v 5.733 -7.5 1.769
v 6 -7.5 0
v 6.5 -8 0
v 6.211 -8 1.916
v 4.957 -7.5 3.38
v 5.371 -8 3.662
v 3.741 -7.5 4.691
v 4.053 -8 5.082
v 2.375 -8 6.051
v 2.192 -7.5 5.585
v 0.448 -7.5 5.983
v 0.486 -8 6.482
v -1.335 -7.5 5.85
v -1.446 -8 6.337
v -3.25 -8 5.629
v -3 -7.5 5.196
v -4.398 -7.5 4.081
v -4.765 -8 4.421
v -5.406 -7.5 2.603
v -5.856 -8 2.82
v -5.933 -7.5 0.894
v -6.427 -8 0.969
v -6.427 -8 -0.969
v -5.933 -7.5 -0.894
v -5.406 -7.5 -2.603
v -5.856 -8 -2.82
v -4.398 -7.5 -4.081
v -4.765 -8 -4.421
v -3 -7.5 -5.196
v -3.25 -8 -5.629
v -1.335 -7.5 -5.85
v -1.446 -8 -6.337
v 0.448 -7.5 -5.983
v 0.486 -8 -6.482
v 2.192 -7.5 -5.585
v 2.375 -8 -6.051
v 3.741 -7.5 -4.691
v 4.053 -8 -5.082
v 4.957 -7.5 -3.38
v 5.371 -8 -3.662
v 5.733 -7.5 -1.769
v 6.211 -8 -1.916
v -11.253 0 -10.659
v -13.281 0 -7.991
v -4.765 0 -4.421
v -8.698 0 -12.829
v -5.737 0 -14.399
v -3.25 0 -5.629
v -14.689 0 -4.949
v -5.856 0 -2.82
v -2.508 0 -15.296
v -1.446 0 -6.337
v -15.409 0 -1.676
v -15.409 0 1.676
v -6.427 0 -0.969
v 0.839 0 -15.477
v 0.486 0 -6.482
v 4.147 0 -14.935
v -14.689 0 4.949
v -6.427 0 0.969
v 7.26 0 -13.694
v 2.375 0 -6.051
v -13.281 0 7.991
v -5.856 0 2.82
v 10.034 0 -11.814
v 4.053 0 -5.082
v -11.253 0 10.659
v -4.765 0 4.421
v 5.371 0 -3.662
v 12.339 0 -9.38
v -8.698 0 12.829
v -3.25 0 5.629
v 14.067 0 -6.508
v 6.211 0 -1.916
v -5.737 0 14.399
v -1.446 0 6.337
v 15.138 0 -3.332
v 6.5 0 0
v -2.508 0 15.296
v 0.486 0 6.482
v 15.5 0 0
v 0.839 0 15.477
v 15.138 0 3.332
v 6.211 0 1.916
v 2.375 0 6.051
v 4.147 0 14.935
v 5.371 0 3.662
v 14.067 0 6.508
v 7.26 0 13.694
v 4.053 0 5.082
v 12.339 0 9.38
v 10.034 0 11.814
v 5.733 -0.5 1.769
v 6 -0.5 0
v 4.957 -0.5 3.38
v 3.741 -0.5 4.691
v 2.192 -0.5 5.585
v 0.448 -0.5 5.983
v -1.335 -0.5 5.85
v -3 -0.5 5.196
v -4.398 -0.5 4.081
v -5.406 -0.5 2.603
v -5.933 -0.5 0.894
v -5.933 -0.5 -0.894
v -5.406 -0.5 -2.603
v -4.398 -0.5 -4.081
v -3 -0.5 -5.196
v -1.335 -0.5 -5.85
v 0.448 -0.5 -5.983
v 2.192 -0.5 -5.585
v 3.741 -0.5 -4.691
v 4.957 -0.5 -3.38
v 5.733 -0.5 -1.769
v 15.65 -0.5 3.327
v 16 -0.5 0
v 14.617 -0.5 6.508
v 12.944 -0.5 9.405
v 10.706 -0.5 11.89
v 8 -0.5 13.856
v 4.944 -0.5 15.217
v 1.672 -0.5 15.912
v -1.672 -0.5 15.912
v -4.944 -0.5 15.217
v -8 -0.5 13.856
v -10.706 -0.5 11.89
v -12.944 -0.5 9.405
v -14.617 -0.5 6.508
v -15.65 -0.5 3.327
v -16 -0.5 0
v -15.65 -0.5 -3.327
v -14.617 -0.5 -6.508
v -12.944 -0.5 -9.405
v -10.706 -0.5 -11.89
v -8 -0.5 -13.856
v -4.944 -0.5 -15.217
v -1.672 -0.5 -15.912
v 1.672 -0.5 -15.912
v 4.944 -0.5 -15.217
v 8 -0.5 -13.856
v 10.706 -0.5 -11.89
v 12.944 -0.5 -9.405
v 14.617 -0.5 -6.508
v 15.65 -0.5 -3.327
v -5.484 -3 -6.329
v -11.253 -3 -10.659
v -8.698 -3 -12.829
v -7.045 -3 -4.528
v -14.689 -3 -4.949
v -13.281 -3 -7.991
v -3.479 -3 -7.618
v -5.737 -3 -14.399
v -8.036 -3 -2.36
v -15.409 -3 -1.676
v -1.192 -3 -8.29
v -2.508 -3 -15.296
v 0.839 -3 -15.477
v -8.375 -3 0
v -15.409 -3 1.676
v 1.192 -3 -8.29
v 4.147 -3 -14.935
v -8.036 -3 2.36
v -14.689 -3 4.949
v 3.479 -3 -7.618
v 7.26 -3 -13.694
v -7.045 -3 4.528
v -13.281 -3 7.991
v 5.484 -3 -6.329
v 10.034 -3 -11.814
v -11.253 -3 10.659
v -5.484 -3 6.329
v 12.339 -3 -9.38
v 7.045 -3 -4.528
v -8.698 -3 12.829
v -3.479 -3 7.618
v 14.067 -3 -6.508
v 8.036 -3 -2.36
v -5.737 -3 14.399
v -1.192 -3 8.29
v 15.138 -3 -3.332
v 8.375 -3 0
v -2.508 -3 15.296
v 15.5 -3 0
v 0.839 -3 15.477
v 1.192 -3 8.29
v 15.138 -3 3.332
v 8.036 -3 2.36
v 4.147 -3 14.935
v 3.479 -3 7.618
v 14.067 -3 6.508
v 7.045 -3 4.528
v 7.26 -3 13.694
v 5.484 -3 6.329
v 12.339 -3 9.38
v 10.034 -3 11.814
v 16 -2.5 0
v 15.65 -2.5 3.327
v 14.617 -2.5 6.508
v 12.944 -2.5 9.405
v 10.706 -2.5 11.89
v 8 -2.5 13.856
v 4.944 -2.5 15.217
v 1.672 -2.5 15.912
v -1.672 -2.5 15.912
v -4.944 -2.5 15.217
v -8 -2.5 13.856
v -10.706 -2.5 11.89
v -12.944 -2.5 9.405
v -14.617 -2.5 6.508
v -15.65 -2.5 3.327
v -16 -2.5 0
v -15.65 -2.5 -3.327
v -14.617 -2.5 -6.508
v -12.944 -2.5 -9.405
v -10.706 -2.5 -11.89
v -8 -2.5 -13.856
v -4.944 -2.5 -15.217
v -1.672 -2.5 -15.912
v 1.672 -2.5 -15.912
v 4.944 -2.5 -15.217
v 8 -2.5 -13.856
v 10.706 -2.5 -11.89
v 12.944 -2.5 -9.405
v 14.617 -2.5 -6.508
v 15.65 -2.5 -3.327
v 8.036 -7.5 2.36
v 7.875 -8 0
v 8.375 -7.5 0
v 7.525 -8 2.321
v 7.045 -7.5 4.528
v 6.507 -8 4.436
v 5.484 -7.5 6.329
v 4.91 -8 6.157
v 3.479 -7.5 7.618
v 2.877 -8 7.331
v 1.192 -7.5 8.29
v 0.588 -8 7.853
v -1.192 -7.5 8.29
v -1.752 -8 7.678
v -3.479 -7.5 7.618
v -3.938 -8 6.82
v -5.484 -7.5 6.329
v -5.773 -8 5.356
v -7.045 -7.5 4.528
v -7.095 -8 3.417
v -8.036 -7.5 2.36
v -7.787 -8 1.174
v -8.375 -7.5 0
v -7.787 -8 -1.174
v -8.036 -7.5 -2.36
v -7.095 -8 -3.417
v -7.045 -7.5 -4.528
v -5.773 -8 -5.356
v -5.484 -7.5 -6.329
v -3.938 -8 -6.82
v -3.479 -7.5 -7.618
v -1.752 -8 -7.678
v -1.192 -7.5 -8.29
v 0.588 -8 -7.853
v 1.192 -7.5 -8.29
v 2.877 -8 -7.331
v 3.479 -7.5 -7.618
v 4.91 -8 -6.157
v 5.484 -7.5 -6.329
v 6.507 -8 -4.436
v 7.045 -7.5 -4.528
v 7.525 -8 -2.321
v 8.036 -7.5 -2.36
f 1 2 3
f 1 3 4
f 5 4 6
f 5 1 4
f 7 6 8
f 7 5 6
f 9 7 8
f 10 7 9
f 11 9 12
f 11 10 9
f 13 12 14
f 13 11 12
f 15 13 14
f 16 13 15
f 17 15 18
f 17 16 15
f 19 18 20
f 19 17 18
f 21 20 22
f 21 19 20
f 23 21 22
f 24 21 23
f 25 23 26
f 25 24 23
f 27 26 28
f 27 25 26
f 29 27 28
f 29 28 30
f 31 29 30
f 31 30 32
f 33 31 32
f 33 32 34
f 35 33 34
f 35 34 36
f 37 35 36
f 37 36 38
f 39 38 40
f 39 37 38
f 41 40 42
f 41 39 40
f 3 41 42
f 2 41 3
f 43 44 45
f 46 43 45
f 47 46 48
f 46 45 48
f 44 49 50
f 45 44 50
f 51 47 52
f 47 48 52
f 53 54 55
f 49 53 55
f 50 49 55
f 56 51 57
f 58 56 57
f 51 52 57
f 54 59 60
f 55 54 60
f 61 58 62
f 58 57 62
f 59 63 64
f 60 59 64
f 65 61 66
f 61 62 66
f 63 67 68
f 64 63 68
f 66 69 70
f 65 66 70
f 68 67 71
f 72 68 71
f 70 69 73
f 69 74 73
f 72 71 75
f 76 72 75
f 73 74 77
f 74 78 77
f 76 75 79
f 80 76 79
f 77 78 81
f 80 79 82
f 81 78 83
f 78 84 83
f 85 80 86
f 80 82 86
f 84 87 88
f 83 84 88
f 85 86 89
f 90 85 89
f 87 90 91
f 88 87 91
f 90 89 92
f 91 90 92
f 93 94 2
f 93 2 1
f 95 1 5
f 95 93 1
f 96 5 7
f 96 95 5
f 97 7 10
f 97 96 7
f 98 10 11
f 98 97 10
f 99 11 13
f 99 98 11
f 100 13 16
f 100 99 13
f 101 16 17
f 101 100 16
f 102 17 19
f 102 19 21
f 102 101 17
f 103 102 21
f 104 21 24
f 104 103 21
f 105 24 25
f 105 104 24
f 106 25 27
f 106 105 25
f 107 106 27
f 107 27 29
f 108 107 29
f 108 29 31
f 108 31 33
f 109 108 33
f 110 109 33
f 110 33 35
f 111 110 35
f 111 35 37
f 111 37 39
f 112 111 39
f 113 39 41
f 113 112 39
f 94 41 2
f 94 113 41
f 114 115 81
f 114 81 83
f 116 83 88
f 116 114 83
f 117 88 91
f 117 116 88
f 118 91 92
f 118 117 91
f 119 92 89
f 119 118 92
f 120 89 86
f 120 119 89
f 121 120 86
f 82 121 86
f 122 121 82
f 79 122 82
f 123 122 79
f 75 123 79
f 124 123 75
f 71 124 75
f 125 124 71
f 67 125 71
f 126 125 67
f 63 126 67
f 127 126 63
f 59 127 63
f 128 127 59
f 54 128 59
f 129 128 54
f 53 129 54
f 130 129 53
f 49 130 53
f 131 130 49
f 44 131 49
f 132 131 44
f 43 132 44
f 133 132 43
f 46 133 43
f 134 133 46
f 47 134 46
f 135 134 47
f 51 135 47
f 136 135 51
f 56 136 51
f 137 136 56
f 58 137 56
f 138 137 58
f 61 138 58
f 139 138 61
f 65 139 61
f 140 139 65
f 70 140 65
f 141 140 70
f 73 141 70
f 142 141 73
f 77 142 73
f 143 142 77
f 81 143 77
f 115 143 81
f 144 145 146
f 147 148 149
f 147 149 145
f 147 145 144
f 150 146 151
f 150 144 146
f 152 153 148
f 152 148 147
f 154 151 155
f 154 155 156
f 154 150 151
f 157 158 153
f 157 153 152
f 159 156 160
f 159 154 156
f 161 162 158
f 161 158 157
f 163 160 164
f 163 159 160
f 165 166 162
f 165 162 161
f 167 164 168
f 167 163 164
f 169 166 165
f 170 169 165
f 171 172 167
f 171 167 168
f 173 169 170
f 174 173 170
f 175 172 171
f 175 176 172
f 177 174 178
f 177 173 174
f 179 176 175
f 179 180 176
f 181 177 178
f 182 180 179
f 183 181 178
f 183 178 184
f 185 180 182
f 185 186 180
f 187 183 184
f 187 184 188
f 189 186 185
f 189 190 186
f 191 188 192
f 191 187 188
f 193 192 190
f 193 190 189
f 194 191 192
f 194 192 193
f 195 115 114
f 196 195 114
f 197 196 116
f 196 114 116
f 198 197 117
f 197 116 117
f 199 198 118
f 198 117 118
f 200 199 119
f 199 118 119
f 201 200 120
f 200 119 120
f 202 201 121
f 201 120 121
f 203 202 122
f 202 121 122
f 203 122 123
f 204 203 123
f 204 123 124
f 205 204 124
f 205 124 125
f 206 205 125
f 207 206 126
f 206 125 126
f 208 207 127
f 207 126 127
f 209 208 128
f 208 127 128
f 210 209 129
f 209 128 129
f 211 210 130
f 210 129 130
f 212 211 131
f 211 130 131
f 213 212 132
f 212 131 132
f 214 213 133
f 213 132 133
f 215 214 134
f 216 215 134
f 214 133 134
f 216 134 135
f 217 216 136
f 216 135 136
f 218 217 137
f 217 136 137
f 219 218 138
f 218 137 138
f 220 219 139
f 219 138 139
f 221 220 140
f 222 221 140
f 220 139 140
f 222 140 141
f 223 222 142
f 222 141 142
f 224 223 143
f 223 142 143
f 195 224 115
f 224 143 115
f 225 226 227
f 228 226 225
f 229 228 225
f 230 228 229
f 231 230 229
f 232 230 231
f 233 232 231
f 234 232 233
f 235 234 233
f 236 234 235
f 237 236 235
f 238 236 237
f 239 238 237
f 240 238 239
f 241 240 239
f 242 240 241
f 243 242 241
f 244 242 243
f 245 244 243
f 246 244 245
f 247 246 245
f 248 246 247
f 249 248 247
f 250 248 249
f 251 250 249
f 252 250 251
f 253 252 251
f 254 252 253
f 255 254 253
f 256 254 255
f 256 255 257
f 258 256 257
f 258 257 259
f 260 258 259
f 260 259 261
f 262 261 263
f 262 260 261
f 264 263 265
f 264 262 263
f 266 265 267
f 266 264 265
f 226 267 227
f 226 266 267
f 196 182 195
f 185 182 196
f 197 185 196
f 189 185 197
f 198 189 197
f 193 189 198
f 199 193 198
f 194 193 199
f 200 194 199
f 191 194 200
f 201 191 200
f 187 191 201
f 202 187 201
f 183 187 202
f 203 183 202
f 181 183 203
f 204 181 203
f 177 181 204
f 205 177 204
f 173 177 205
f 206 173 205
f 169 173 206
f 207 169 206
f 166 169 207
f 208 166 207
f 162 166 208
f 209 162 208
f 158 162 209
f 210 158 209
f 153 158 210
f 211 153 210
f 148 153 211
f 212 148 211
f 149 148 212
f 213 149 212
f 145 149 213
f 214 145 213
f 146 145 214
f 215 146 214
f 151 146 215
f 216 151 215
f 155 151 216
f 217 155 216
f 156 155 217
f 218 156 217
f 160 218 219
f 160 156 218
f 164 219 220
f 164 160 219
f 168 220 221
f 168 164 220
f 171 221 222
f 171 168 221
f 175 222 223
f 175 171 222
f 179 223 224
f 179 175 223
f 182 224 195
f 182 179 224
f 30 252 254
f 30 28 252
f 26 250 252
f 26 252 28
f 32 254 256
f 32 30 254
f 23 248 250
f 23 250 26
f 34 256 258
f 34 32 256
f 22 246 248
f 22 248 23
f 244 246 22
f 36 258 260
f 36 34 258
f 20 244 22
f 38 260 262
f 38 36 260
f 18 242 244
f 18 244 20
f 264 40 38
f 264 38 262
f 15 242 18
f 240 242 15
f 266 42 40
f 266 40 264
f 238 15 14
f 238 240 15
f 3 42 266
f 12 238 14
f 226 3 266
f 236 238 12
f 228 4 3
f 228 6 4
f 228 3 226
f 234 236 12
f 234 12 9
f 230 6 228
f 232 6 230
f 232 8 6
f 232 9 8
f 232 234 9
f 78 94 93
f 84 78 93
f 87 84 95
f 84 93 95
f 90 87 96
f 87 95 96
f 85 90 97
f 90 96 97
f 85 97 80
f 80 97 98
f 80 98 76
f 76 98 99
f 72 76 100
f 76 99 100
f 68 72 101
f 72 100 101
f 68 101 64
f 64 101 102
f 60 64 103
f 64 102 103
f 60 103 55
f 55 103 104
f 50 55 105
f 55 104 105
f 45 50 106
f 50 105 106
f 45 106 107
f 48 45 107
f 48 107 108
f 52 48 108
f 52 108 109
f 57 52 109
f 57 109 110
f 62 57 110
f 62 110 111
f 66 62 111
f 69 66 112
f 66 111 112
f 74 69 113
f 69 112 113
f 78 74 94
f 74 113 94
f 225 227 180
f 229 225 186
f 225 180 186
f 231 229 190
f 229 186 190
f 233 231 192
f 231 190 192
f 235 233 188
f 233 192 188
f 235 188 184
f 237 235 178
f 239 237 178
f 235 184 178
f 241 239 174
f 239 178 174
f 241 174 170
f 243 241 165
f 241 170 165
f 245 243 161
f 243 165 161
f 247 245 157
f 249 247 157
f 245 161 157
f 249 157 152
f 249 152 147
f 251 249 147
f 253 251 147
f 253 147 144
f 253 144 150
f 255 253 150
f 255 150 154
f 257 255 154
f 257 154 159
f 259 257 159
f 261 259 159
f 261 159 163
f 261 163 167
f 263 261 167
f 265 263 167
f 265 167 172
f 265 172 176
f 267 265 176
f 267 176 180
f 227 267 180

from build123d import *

# Parameters (mm, degrees)
F0_R     = 16
F0_R_2   = 8.375
F0_R_3   = 6
F1_DEPTH = 3
F2_DEPTH = 8
F3_SIZE  = 0.5


with BuildPart() as f1:
    # F0 (on Front) → F1 (new body)
    with BuildSketch(Plane.XZ):
        Circle(F0_R)
        Circle(F0_R_2, mode=Mode.SUBTRACT)
        Circle(F0_R_2)
        Circle(F0_R_3, mode=Mode.SUBTRACT)
    extrude(amount=F1_DEPTH)

    # F0 (on Front) → F2 (join)
    with BuildSketch(Plane.XZ):
        Circle(F0_R_2)
        Circle(F0_R_3, mode=Mode.SUBTRACT)
    extrude(amount=F2_DEPTH)

    # F3
    f3_edges = [f1.edges().sort_by_distance(p)[0] for p in [
        (16, -1.5, 0),
        (-16, 0, 0),
        (-16, -3, 0),
        (-6, 0, 0),
        (6, -4, 0),
        (-6, -8, 0),
        (-8.375, -8, 0),
    ]]
    chamfer(f3_edges, length=F3_SIZE)


solid = f1.part
